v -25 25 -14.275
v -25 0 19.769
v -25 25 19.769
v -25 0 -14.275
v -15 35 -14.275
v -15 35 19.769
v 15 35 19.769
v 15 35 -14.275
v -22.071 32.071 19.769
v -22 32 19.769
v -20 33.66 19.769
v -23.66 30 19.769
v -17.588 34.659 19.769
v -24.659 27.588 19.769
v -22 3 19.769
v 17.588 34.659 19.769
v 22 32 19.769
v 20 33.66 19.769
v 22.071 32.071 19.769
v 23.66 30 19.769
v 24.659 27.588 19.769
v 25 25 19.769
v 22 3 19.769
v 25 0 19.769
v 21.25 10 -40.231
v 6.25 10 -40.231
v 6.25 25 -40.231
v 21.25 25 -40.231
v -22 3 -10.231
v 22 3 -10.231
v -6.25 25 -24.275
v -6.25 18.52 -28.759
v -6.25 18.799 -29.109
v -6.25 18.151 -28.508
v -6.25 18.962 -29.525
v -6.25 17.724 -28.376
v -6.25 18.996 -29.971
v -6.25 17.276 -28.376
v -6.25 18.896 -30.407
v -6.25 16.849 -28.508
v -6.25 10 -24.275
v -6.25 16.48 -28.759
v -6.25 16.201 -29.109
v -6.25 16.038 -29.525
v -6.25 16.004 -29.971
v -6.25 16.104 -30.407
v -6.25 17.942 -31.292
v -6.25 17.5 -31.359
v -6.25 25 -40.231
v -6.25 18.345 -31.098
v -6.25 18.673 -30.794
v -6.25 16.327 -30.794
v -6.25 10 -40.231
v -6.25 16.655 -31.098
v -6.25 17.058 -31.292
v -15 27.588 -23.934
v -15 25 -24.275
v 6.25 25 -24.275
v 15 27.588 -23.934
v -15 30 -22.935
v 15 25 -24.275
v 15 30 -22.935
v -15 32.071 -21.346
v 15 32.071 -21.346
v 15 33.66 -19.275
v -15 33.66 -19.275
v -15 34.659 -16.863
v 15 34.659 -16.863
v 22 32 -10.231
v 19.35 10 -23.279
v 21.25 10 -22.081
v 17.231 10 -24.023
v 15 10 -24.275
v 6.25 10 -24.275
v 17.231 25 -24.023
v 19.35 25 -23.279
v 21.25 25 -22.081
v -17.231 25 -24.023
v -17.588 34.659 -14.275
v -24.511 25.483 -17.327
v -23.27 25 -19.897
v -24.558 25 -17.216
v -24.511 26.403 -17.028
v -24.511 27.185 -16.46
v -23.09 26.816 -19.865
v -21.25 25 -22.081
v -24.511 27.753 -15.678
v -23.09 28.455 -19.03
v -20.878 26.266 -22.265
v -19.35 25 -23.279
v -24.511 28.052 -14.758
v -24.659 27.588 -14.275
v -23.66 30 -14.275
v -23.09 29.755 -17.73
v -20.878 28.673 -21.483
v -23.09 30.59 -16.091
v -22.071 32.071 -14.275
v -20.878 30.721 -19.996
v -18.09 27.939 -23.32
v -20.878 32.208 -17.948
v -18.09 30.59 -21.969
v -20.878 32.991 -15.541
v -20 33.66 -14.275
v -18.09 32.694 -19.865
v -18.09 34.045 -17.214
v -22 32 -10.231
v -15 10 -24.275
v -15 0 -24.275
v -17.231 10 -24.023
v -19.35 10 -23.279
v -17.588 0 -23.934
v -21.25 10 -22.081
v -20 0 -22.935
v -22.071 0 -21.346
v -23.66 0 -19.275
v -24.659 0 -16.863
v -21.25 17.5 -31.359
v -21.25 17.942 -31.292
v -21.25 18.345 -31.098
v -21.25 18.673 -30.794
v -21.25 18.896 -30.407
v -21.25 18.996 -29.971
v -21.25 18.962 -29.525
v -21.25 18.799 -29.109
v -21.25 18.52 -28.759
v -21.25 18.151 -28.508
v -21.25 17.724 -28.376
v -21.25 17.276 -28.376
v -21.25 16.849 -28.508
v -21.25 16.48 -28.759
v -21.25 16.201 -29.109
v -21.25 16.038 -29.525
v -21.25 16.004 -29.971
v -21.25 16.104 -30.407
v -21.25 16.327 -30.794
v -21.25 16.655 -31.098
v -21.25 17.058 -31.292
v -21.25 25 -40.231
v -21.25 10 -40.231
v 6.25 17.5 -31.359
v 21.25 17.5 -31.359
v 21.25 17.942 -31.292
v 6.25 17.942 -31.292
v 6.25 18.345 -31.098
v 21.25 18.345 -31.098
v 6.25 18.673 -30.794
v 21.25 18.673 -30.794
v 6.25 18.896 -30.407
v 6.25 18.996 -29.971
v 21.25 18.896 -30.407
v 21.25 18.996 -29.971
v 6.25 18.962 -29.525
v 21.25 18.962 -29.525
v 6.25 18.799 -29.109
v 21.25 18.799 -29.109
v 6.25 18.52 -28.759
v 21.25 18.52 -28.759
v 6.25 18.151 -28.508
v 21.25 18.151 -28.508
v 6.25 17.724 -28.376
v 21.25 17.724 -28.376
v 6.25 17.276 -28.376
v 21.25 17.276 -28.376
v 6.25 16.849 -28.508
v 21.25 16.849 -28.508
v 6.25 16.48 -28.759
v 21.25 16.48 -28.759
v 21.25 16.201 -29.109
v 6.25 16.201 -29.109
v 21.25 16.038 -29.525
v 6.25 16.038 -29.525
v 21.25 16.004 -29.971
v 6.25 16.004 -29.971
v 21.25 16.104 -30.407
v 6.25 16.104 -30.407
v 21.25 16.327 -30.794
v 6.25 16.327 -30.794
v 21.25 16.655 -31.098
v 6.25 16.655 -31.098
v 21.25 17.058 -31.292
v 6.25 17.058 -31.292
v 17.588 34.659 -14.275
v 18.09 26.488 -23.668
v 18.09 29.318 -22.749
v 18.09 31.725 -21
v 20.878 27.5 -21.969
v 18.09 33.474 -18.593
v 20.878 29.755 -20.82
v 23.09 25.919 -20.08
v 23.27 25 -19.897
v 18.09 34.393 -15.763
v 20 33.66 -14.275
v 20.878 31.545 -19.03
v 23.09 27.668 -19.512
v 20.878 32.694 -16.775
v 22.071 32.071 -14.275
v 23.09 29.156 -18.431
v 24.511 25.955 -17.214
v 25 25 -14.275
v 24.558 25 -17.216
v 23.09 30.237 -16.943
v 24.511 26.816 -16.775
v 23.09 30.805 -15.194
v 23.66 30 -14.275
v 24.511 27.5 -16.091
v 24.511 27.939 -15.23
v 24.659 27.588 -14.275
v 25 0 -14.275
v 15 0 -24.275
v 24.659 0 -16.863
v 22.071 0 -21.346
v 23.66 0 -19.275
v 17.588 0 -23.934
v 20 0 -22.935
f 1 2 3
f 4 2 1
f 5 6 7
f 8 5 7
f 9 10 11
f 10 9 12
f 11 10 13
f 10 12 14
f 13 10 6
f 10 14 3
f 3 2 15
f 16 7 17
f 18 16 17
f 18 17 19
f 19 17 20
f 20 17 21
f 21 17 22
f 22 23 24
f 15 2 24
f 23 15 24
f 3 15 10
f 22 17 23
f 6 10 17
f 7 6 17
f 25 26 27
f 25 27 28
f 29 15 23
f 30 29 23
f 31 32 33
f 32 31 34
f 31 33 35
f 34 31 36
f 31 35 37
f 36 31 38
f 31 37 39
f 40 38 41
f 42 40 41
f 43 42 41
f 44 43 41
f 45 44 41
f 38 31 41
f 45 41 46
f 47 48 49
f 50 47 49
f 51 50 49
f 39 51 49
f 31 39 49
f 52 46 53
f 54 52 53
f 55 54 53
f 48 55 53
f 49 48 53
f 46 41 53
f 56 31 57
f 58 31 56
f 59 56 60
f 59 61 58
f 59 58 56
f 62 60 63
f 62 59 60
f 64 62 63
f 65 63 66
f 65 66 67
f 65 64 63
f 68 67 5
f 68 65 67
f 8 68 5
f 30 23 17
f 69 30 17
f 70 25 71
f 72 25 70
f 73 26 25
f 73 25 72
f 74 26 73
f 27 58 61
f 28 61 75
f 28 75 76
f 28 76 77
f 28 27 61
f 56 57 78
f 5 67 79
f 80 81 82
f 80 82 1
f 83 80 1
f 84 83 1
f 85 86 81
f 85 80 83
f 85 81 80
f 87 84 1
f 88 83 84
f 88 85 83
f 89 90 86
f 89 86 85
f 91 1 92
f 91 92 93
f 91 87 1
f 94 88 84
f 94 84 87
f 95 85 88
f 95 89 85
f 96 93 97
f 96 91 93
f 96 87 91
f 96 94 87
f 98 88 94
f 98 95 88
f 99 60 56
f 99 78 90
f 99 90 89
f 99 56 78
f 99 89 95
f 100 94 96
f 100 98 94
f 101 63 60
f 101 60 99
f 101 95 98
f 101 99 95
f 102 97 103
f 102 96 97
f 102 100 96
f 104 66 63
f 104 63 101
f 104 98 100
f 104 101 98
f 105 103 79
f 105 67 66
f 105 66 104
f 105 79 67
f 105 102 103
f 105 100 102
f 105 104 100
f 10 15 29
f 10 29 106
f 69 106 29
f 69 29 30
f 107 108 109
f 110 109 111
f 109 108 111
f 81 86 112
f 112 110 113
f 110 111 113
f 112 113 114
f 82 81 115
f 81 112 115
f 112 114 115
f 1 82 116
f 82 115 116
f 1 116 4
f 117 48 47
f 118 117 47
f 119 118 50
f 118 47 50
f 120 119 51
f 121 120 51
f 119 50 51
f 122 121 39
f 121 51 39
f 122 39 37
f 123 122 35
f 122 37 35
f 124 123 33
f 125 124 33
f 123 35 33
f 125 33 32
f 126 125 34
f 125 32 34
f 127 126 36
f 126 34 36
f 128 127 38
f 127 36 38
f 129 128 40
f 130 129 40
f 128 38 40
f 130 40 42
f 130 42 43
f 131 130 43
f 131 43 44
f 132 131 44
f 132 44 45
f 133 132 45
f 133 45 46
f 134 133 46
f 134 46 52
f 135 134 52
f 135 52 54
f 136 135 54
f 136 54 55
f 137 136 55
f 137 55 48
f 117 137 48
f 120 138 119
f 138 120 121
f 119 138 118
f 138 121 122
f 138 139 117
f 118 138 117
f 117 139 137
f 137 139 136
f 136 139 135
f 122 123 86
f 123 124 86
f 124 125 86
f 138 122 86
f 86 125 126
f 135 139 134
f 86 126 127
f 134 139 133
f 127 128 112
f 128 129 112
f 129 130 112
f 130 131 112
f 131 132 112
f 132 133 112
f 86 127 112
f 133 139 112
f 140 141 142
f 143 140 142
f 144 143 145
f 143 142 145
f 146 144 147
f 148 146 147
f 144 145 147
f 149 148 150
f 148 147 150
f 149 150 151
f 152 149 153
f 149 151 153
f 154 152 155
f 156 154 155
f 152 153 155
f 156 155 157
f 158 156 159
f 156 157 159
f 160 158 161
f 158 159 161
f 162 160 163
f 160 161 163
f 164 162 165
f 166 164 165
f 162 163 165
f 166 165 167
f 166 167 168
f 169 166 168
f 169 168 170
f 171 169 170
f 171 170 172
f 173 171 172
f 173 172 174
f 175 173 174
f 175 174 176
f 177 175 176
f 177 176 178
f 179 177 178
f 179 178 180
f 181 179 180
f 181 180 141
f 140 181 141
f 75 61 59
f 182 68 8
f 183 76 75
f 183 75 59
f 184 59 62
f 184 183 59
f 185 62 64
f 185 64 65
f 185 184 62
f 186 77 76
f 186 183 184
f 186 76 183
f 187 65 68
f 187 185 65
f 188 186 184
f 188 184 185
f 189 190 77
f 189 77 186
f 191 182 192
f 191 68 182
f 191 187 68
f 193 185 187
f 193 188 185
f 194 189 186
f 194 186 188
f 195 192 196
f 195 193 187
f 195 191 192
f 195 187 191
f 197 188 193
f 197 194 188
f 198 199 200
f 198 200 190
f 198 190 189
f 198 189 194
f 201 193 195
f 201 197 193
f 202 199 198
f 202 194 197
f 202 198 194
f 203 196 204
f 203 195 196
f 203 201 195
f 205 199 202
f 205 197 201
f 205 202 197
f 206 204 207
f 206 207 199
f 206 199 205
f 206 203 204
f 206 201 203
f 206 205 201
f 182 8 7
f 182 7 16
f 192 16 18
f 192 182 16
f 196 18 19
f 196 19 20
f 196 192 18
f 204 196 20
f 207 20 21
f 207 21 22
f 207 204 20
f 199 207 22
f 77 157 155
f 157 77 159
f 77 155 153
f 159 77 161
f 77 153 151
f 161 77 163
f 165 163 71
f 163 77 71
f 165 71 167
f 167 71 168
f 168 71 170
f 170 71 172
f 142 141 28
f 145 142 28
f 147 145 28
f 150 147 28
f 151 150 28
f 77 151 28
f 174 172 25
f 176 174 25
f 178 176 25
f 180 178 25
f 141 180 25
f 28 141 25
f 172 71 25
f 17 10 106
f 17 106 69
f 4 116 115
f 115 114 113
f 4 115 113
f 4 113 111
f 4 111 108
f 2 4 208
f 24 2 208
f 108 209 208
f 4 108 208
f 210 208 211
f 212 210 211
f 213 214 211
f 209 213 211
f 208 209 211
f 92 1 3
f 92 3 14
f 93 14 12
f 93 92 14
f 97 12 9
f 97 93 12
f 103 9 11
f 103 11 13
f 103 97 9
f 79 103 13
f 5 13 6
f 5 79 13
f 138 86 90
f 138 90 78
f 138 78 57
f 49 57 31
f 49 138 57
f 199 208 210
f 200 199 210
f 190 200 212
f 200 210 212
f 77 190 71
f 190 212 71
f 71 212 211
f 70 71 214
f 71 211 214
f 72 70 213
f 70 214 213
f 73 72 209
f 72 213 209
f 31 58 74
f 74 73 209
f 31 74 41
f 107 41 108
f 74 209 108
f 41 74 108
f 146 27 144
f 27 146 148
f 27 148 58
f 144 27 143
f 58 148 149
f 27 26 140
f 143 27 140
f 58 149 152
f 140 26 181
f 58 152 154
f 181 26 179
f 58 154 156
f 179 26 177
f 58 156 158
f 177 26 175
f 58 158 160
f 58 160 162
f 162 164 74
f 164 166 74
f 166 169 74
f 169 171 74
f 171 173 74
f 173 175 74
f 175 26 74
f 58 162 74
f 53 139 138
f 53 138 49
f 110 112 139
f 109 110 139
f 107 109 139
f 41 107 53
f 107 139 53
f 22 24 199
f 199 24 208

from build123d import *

# Parameters (mm, degrees)
SKETCH1_W           = 50
SKETCH1_H           = 60
BOSS_EXTRUDE1_DEPTH = 35
SKETCH2_W           = 44
SKETCH2_H           = 29
CUT_EXTRUDE1_DEPTH  = 30
CUT_EXTRUDE2_DEPTH  = 36
SKETCH5_R           = 1.5
CUT_EXTRUDE3_DEPTH  = 48
CUT_EXTRUDE5_DEPTH  = 50.17
FILLET1_R           = 10
FILLET2_START       = -24.274933135
FILLET2_OUTLINE_W   = 50
FILLET2_OUTLINE_H   = 35
FILLET2_DEPTH       = 10
FILLET2_START_2     = -15.881773092
FILLET2_2_DEPTH     = 35.650922027
FILLET2_3_DEPTH     = 25
FILLET2_START_3     = 10
FILLET2_4_DEPTH     = 15
FILLET2_5_ANGLE     = 90


with BuildPart() as part:
    # Sketch1 → Boss-Extrude1 (new body)
    with BuildSketch(Plane(origin=(0, 0, 0), x_dir=(1, 0, 0), z_dir=(0, 1, 0))):
        with Locations((0, 10.230851065)):
            Rectangle(SKETCH1_W, SKETCH1_H)
    extrude(amount=BOSS_EXTRUDE1_DEPTH)

    # Sketch2 → Cut-Extrude1 (cut)
    with BuildSketch(Plane.XY.offset(19.769148935)):
        with Locations((0, 17.5)):
            Rectangle(SKETCH2_W, SKETCH2_H)
    extrude(amount=-CUT_EXTRUDE1_DEPTH, mode=Mode.SUBTRACT)

    # Sketch4 → Cut-Extrude2 (cut)
    with BuildSketch(Plane(origin=(0, 0, 0), x_dir=(-1, 0, 0), z_dir=(0, -1, 0))):
        Polygon((-25, 24.274933135), (-21.25, 24.274933135), (-21.25, 40.230851065), (-6.25, 40.230851065), (-6.25, 24.274933135), (6.25, 24.274933135), (6.25, 40.230851065), (21.25, 40.230851065), (21.25, 24.274933135), (25, 24.274933135), (38.228638219, 24.274933135), (38.228638219, 61.695696762), (-27.361816785, 61.695696762), (-27.361816785, 24.274933135), align=None)
    extrude(amount=-CUT_EXTRUDE2_DEPTH, mode=Mode.SUBTRACT)

    # Sketch5 → Cut-Extrude3 (cut)
    with BuildSketch(Plane(origin=(21.25, 0, 0), x_dir=(0, 0, -1), z_dir=(1, 0, 0))):
        with Locations((29.859024855, 17.5)):
            Circle(SKETCH5_R)
    extrude(amount=-CUT_EXTRUDE3_DEPTH, mode=Mode.SUBTRACT)

    # Sketch12 → Cut-Extrude5 (cut)
    with BuildSketch(Plane.ZY.offset(21.25)):
        Polygon((-40.230851065, 10), (-24.274933135, 10), (-24.274933135, -4.872452702), (-41.905821838, -4.872452702), (-41.905821838, 36.918280203), (-24.274933135, 36.918280203), (-24.274933135, 25), (-40.230851065, 25), align=None)
    extrude(amount=-CUT_EXTRUDE5_DEPTH, mode=Mode.SUBTRACT)

    # Fillet1
    fillet1_edges = [part.edges().sort_by_distance(p)[0] for p in [
        (0, 35, -24.274933135),
    ]]
    fillet(fillet1_edges, radius=FILLET1_R - 0.0001)  # a hair under: the kernel refuses the full size

    # Fillet2: read off the stored shape, not the designer's step
    # Fillet2 outline → Fillet2 (cut)
    with BuildSketch(Plane.XY.offset(FILLET2_START)):
        with Locations((0, 17.5)):
            Rectangle(FILLET2_OUTLINE_W, FILLET2_OUTLINE_H)
    extrude(amount=FILLET2_DEPTH, mode=Mode.SUBTRACT)

    # Fillet2 2 outline → Fillet2 2 (cut)
    with BuildSketch(Plane.XY.offset(FILLET2_START_2)):
        with BuildLine():
            Line((25, 35), (15, 35))
            ThreePointArc((15, 35), (22.071067812, 32.071067812), (25, 25))
            Line((25, 25), (25, 35))
        make_face()
        with BuildLine():
            ThreePointArc((-25, 25), (-22.071067812, 32.071067812), (-15, 35))
            Line((-15, 35), (-25, 35))
            Line((-25, 35), (-25, 25))
        make_face()
    extrude(amount=FILLET2_2_DEPTH, mode=Mode.SUBTRACT)

    # Fillet2 3 outline → Fillet2 3 (add)
    with BuildSketch(Plane(origin=(0, 0, 0), x_dir=(1, 0, 0), z_dir=(0, 1, 0))):
        with BuildLine():
            ThreePointArc((-15, 24.274933135), (-22.071067812, 21.346000947), (-25, 14.274933135))
            Line((-25, 14.274933135), (25, 14.274933135))
            ThreePointArc((25, 14.274933135), (22.071067812, 21.346000947), (15, 24.274933135))
            Line((15, 24.274933135), (-15, 24.274933135))
        make_face()
    extrude(amount=FILLET2_3_DEPTH)

    # Fillet2 4 outline → Fillet2 4 (add)
    with BuildSketch(Plane(origin=(0, 0, 0), x_dir=(1, 0, 0), z_dir=(0, 1, 0)).offset(FILLET2_START_3)):
        with BuildLine():
            Line((-21.25, 24.274933135), (-21.25, 22.081180633))
            ThreePointArc((-21.25, 22.081180633), (-18.311912214, 23.710569706), (-15, 24.274933135))
            Line((-15, 24.274933135), (-21.25, 24.274933135))
        make_face()
        with BuildLine():
            ThreePointArc((15, 24.274933135), (18.311912214, 23.710569706), (21.25, 22.081180633))
            Line((21.25, 22.081180633), (21.25, 24.274933135))
            Line((21.25, 24.274933135), (15, 24.274933135))
        make_face()
    extrude(amount=FILLET2_4_DEPTH)

    # Fillet2 5 outline → Fillet2 5 (revolve)
    with BuildSketch(Plane(origin=(0, 25, -14.274933135), x_dir=(0, 0, -1), z_dir=(0, -1, 0))):
        with BuildLine():
            Line((10, -15), (10, 15))
            ThreePointArc((10, 15), (7.071067812, 22.071067812), (0, 25))
            Line((0, 25), (0, -25))
            ThreePointArc((0, -25), (7.071067812, -22.071067812), (10, -15))
        make_face()
    revolve(axis=Axis((0, 25, -14.274933135), (1, 0, 0)), revolution_arc=FILLET2_5_ANGLE)


solid = part.part
